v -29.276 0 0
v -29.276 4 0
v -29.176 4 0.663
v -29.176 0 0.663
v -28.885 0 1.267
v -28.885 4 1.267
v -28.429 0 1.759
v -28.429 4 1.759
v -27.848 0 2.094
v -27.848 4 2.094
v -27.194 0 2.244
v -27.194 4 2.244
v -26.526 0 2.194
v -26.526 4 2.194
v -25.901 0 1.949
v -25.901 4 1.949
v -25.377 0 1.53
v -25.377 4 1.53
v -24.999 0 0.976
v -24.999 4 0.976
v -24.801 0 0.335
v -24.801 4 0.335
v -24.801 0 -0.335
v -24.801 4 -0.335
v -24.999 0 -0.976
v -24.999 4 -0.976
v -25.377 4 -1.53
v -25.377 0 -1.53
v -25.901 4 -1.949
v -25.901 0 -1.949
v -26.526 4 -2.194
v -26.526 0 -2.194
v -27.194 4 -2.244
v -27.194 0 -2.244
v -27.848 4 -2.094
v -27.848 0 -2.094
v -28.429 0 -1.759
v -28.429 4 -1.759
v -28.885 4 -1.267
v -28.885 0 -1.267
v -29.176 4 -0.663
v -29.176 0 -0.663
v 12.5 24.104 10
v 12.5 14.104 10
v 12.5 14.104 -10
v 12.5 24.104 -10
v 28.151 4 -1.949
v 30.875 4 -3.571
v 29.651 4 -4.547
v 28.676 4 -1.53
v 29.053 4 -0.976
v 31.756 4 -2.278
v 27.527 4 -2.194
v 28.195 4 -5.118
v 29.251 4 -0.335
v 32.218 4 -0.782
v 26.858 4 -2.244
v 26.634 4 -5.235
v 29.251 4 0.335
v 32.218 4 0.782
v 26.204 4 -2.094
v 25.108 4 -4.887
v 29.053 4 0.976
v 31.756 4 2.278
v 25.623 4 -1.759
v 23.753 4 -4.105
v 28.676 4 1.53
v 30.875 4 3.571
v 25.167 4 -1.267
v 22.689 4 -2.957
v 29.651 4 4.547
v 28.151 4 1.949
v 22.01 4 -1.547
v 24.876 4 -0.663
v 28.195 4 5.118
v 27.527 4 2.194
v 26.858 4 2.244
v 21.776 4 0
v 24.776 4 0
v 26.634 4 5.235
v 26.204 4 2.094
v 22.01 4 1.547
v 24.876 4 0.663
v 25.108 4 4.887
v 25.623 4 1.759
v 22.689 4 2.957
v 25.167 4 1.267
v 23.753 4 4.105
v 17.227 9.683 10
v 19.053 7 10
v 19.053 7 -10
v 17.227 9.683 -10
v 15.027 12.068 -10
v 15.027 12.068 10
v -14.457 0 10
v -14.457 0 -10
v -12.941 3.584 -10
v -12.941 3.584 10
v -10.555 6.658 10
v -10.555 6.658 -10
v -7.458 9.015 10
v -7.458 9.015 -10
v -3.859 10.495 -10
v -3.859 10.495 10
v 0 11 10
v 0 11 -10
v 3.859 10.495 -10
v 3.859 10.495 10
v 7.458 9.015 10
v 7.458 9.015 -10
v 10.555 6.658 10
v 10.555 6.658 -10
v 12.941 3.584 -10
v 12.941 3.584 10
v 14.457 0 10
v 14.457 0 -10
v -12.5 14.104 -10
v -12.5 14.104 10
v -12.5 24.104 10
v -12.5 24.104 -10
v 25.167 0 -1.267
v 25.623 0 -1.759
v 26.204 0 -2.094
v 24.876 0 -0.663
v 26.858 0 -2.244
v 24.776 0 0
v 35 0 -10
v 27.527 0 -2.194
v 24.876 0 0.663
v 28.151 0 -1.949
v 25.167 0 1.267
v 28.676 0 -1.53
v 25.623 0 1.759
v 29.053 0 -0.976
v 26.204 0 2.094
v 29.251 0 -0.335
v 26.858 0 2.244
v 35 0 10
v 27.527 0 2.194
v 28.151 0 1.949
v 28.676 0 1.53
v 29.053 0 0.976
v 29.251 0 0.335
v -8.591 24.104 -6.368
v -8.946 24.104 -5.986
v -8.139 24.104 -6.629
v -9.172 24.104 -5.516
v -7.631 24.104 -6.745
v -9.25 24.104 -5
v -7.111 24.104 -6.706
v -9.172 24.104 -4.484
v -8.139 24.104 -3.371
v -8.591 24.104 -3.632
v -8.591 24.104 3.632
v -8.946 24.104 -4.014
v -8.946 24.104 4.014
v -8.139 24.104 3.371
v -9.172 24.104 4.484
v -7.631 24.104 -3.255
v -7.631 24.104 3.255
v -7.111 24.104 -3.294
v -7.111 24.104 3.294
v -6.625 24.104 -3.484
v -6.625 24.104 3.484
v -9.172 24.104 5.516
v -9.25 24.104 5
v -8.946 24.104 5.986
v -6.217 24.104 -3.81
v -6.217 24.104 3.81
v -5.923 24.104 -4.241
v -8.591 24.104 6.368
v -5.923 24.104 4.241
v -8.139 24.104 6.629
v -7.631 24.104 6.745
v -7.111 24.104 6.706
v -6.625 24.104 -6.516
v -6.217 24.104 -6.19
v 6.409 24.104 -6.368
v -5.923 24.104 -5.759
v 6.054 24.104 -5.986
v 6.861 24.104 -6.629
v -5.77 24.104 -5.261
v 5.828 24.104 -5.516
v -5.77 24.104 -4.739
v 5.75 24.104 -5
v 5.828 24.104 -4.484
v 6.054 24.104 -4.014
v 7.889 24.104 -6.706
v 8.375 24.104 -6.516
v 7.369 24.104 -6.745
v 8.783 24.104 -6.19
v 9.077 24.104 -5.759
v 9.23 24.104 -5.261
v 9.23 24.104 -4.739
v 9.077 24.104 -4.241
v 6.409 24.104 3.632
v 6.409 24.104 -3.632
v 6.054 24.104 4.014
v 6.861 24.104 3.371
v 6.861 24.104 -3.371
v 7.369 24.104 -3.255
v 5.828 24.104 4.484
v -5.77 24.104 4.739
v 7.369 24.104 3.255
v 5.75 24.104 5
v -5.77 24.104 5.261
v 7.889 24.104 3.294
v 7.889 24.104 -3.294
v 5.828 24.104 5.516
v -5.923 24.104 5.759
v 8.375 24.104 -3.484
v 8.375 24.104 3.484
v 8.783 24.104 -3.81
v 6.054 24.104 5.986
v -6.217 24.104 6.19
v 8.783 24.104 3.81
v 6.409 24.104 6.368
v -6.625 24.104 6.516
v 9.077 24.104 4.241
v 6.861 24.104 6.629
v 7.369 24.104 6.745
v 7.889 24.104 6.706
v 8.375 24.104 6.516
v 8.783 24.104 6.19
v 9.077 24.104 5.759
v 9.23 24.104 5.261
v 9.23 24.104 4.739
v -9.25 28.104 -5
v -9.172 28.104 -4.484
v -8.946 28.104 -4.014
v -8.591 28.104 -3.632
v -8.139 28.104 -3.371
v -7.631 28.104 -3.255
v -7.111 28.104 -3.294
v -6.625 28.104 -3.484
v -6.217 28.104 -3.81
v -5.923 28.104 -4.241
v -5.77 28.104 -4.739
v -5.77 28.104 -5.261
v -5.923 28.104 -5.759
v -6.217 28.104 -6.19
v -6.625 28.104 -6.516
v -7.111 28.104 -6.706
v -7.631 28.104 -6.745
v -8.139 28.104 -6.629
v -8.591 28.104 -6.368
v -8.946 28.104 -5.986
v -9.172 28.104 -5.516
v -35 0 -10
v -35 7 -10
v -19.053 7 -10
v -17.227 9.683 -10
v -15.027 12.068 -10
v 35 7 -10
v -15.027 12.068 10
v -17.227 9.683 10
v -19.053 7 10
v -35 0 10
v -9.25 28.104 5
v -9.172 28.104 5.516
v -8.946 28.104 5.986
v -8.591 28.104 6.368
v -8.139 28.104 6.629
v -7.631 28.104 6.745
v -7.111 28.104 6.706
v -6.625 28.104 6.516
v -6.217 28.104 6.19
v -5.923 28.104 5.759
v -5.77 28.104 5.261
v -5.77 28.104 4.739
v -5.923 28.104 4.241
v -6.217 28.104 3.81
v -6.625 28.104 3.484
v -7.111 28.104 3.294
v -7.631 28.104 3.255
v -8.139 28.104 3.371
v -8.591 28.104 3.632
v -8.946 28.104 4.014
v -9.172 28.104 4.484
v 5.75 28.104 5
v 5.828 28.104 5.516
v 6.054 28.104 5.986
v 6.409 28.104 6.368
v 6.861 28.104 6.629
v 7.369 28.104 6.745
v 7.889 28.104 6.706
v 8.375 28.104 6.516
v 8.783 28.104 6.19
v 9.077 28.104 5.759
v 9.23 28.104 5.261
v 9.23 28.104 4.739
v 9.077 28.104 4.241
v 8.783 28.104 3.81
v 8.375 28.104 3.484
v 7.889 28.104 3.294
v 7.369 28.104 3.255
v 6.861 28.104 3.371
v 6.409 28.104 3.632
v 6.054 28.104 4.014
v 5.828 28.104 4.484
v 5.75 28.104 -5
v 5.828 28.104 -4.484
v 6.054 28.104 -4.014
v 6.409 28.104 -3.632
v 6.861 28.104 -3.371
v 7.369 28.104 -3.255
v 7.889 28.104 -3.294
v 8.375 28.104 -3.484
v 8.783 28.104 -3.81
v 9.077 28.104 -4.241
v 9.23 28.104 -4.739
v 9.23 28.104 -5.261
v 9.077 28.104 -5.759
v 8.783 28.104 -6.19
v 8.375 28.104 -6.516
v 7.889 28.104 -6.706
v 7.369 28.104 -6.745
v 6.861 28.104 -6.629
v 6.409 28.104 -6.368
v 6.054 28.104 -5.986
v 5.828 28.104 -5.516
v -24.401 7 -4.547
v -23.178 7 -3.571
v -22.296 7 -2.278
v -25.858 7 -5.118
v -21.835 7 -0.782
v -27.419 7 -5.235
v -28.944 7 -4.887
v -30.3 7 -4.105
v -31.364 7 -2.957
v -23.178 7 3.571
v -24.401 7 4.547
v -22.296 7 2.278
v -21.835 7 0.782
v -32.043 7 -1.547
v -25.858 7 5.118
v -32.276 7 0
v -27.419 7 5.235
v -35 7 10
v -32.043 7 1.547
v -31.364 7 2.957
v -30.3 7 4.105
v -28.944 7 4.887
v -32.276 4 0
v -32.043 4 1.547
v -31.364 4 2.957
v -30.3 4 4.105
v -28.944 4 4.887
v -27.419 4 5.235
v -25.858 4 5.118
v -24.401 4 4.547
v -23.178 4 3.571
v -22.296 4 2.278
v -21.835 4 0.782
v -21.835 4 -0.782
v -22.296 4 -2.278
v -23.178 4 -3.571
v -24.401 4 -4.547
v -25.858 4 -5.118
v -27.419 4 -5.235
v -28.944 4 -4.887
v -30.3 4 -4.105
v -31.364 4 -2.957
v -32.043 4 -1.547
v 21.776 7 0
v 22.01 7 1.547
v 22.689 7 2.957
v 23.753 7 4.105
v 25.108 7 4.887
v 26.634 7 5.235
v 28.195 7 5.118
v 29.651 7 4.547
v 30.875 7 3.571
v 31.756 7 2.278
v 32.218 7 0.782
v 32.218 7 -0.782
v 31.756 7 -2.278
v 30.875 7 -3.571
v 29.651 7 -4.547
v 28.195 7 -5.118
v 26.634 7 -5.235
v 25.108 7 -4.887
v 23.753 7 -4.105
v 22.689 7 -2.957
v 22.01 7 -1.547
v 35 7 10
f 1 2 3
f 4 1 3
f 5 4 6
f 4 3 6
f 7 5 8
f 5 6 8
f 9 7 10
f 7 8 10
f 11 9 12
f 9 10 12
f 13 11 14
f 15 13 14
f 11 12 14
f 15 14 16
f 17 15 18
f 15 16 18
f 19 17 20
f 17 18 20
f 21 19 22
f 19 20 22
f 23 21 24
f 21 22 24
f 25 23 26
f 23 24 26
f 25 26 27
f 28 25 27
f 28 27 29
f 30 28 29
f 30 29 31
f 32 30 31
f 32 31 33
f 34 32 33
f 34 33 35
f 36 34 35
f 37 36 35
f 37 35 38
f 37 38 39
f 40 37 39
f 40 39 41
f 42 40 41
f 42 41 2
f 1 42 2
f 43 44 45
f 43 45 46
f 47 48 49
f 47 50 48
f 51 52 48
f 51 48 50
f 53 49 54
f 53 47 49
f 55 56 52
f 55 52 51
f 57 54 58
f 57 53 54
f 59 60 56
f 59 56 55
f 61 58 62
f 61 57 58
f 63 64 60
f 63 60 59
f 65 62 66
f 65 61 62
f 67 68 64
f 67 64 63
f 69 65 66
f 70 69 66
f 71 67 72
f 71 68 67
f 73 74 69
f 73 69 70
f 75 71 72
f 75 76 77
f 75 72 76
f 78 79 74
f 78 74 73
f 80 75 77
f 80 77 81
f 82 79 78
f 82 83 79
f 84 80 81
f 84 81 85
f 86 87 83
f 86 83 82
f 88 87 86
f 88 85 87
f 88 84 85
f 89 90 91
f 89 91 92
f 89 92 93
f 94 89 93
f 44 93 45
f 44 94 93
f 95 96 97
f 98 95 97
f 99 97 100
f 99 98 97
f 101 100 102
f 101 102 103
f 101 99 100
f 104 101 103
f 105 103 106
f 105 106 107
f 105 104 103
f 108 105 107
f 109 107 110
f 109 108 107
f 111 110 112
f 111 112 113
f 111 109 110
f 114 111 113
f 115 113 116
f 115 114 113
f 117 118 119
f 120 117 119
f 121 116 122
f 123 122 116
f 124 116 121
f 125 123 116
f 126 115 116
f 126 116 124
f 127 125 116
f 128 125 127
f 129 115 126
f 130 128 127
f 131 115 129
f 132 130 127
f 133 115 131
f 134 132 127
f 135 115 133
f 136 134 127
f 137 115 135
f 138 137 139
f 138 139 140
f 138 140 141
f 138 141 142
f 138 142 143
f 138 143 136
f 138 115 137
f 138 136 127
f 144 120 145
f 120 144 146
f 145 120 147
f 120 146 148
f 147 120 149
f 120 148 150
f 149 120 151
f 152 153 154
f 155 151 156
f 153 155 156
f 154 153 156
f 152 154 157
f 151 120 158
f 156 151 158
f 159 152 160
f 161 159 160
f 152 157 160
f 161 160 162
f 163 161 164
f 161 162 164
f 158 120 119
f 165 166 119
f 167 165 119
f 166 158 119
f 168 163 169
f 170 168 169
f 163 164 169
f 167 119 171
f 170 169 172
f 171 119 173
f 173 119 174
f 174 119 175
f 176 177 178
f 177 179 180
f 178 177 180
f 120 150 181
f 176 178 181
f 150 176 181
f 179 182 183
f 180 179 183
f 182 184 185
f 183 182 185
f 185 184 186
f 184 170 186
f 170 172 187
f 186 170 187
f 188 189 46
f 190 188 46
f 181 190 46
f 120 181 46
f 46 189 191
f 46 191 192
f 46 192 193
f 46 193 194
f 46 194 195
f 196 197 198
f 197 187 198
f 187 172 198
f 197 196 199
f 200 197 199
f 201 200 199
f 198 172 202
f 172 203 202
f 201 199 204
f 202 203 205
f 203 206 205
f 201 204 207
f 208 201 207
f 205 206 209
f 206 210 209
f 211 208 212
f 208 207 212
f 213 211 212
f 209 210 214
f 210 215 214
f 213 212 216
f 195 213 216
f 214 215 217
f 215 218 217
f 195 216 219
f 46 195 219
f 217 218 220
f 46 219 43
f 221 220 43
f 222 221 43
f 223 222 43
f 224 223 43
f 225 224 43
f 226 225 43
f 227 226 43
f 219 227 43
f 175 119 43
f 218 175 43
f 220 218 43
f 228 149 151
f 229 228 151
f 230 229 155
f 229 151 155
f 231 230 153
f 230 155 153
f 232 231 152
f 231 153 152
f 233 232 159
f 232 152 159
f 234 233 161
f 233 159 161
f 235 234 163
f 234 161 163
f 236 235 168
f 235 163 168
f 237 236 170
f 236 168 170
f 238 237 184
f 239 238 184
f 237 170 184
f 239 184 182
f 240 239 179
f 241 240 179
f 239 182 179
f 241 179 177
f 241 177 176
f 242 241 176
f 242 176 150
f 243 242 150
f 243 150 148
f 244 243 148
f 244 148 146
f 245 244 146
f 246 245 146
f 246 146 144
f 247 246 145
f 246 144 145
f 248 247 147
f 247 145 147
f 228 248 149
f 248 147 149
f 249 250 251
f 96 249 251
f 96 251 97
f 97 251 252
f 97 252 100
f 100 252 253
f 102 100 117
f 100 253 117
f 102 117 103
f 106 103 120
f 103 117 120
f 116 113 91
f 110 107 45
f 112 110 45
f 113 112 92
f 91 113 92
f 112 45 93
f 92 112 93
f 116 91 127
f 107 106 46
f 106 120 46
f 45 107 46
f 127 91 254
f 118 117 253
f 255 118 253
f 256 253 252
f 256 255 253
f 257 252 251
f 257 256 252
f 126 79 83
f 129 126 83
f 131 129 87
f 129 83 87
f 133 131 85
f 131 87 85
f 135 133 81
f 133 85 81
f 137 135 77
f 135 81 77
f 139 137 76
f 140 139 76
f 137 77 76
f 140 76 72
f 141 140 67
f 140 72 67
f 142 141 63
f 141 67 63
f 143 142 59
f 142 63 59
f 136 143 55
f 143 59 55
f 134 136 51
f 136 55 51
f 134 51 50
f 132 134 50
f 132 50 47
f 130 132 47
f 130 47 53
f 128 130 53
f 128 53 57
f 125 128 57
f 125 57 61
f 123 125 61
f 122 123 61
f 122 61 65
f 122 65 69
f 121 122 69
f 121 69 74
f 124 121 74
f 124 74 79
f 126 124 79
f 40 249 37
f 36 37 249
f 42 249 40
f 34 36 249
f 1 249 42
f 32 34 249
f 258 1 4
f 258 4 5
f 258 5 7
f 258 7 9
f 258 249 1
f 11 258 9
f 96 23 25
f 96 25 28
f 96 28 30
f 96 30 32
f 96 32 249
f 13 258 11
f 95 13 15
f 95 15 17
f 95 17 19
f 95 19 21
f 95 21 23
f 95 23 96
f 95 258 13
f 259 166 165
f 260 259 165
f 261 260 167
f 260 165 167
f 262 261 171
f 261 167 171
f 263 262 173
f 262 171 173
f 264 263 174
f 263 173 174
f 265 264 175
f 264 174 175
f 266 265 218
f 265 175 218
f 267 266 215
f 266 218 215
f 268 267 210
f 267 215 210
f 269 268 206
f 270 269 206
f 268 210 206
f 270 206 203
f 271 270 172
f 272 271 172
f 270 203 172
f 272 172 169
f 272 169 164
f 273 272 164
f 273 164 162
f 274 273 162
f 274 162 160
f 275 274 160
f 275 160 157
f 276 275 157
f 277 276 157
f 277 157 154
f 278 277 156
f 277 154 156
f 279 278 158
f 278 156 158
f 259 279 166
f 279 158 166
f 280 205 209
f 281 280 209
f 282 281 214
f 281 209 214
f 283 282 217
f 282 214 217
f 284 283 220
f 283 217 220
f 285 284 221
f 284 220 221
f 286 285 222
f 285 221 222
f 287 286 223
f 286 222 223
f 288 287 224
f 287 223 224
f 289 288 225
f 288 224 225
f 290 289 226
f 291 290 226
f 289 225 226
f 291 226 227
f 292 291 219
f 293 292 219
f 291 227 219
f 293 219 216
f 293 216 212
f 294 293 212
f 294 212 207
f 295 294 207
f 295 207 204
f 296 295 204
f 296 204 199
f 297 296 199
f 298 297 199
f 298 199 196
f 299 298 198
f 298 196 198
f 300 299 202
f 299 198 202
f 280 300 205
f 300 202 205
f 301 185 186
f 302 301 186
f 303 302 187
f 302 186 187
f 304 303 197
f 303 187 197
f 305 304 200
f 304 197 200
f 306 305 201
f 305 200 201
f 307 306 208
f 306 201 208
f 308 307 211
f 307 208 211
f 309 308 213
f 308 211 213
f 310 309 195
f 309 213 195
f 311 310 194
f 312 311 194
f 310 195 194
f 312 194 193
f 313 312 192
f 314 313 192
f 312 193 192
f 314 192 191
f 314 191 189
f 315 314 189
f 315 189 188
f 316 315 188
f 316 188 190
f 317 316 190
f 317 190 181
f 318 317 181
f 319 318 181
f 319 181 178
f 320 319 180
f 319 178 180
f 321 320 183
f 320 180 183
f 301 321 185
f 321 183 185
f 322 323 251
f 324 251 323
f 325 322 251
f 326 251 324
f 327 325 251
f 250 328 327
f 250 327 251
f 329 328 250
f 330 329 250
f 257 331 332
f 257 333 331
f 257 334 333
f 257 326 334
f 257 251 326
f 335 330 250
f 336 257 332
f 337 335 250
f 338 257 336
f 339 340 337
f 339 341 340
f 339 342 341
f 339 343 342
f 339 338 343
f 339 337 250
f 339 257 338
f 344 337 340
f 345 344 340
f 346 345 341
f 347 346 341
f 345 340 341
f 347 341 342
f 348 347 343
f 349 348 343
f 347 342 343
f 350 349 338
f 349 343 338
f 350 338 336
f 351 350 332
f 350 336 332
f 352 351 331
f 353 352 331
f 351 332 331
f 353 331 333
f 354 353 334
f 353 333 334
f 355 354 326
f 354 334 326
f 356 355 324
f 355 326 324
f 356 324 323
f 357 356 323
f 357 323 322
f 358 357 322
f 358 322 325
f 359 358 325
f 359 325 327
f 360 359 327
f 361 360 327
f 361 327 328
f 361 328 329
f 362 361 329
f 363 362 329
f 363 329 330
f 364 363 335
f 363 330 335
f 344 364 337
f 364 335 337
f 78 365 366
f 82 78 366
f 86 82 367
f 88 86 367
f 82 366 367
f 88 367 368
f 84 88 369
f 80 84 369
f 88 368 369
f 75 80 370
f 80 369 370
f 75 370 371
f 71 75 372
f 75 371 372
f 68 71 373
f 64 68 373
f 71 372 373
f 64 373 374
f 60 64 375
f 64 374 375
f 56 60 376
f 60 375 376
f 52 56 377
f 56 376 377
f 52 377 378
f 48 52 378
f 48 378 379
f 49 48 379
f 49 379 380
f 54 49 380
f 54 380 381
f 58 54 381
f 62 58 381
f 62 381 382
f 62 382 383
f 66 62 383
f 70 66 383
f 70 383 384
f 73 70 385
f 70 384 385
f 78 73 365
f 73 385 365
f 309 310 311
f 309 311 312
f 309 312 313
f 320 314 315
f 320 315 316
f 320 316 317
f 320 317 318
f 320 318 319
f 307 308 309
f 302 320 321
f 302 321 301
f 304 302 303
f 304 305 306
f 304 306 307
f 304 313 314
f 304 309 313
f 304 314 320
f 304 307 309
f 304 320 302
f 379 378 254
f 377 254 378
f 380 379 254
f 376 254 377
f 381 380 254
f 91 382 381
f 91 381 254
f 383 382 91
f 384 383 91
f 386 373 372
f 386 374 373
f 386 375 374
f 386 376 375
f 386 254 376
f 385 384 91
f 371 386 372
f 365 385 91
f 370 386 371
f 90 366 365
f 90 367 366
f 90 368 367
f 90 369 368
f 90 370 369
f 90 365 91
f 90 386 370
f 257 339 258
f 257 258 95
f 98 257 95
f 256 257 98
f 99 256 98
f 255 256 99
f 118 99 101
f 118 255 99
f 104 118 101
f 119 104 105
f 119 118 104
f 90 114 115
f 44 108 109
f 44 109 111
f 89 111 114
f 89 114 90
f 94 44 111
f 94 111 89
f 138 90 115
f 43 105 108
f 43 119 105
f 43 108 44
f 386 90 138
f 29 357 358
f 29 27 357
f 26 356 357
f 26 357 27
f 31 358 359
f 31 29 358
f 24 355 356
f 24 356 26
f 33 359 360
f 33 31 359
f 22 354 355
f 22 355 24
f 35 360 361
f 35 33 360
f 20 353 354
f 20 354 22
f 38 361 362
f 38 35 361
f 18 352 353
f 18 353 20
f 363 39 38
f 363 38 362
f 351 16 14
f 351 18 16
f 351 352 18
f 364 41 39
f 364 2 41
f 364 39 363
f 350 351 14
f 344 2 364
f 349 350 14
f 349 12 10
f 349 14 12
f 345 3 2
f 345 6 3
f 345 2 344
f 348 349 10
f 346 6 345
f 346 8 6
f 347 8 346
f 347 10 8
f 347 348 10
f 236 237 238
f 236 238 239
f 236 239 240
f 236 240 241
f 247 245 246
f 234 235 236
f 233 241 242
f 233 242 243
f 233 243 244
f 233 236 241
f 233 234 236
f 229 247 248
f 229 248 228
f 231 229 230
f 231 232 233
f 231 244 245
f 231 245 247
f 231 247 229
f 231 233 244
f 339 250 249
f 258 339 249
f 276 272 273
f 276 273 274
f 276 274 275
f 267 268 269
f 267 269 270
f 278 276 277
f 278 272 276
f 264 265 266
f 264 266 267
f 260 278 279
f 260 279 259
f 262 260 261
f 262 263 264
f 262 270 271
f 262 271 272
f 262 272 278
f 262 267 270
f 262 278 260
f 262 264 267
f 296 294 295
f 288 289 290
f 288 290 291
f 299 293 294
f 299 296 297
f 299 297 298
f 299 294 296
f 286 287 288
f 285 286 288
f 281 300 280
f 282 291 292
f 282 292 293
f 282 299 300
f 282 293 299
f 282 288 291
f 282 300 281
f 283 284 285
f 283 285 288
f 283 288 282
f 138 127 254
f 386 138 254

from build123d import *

# Parameters (mm, degrees)
F1_DEPTH = 10
F2_R     = 2.25
F3_DEPTH = 25
F4_R     = 5.25
F4_R_2   = 2.25
F5_DEPTH = 3
F6_W     = 25
F6_H     = 10
F7_DEPTH = 20
F8_R     = 1.75
F9_DEPTH = 4


with BuildPart() as f1:
    # F0 (on Top) → F1 (new body, symmetric)
    with BuildSketch(Plane.XY):
        with BuildLine():
            Line((-35, 7), (-35, 0))
            Line((-35, 0), (-14.456832, 0))
            ThreePointArc((-14.456832, 0), (0, 11), (14.456832, 0))
            Line((14.456832, 0), (35, 0))
            Line((35, 0), (35, 7))
            Line((35, 7), (19.052559, 7))
            ThreePointArc((19.052559, 7), (0, 18), (-19.052559, 7))
            Line((-19.052559, 7), (-35, 7))
        make_face()
    extrude(amount=F1_DEPTH, both=True)

    # F2 (on face) → F3 (cut)
    with BuildSketch(Plane(origin=(0, 7, 0), x_dir=(-1, 0, 0), z_dir=(0, 1, 0))):
        with Locations((-27.026279, 0)):
            Circle(F2_R)
        with Locations((27.026279, 0)):
            Circle(F2_R)
    extrude(amount=-F3_DEPTH, mode=Mode.SUBTRACT)

    # F4 (on face) → F5 (cut)
    with BuildSketch(Plane(origin=(0, 7, 0), x_dir=(-1, 0, 0), z_dir=(0, 1, 0))):
        with Locations((27.026279, 0)):
            Circle(F4_R)
        with Locations((27.026279, 0)):
            Circle(F4_R_2, mode=Mode.SUBTRACT)
        with Locations((-27.026279, 0)):
            Circle(F4_R)
    extrude(amount=-F5_DEPTH, mode=Mode.SUBTRACT)

    # F6 (on face) → F7 (join)
    with BuildSketch(Plane.XY.offset(10)):
        with Locations((0, 19.103867)):
            Rectangle(F6_W, F6_H)
    extrude(amount=-F7_DEPTH)

    # F8 (on face) → F9 (join)
    with BuildSketch(Plane(origin=(0, 24.103867, 0), x_dir=(-1, 0, 0), z_dir=(0, 1, 0))):
        with Locations((7.5, -5)):
            Circle(F8_R)
        with Locations((-7.5, -5)):
            Circle(F8_R)
        with Locations((7.5, 5)):
            Circle(F8_R)
        with Locations((-7.5, 5)):
            Circle(F8_R)
    extrude(amount=F9_DEPTH)


solid = f1.part
